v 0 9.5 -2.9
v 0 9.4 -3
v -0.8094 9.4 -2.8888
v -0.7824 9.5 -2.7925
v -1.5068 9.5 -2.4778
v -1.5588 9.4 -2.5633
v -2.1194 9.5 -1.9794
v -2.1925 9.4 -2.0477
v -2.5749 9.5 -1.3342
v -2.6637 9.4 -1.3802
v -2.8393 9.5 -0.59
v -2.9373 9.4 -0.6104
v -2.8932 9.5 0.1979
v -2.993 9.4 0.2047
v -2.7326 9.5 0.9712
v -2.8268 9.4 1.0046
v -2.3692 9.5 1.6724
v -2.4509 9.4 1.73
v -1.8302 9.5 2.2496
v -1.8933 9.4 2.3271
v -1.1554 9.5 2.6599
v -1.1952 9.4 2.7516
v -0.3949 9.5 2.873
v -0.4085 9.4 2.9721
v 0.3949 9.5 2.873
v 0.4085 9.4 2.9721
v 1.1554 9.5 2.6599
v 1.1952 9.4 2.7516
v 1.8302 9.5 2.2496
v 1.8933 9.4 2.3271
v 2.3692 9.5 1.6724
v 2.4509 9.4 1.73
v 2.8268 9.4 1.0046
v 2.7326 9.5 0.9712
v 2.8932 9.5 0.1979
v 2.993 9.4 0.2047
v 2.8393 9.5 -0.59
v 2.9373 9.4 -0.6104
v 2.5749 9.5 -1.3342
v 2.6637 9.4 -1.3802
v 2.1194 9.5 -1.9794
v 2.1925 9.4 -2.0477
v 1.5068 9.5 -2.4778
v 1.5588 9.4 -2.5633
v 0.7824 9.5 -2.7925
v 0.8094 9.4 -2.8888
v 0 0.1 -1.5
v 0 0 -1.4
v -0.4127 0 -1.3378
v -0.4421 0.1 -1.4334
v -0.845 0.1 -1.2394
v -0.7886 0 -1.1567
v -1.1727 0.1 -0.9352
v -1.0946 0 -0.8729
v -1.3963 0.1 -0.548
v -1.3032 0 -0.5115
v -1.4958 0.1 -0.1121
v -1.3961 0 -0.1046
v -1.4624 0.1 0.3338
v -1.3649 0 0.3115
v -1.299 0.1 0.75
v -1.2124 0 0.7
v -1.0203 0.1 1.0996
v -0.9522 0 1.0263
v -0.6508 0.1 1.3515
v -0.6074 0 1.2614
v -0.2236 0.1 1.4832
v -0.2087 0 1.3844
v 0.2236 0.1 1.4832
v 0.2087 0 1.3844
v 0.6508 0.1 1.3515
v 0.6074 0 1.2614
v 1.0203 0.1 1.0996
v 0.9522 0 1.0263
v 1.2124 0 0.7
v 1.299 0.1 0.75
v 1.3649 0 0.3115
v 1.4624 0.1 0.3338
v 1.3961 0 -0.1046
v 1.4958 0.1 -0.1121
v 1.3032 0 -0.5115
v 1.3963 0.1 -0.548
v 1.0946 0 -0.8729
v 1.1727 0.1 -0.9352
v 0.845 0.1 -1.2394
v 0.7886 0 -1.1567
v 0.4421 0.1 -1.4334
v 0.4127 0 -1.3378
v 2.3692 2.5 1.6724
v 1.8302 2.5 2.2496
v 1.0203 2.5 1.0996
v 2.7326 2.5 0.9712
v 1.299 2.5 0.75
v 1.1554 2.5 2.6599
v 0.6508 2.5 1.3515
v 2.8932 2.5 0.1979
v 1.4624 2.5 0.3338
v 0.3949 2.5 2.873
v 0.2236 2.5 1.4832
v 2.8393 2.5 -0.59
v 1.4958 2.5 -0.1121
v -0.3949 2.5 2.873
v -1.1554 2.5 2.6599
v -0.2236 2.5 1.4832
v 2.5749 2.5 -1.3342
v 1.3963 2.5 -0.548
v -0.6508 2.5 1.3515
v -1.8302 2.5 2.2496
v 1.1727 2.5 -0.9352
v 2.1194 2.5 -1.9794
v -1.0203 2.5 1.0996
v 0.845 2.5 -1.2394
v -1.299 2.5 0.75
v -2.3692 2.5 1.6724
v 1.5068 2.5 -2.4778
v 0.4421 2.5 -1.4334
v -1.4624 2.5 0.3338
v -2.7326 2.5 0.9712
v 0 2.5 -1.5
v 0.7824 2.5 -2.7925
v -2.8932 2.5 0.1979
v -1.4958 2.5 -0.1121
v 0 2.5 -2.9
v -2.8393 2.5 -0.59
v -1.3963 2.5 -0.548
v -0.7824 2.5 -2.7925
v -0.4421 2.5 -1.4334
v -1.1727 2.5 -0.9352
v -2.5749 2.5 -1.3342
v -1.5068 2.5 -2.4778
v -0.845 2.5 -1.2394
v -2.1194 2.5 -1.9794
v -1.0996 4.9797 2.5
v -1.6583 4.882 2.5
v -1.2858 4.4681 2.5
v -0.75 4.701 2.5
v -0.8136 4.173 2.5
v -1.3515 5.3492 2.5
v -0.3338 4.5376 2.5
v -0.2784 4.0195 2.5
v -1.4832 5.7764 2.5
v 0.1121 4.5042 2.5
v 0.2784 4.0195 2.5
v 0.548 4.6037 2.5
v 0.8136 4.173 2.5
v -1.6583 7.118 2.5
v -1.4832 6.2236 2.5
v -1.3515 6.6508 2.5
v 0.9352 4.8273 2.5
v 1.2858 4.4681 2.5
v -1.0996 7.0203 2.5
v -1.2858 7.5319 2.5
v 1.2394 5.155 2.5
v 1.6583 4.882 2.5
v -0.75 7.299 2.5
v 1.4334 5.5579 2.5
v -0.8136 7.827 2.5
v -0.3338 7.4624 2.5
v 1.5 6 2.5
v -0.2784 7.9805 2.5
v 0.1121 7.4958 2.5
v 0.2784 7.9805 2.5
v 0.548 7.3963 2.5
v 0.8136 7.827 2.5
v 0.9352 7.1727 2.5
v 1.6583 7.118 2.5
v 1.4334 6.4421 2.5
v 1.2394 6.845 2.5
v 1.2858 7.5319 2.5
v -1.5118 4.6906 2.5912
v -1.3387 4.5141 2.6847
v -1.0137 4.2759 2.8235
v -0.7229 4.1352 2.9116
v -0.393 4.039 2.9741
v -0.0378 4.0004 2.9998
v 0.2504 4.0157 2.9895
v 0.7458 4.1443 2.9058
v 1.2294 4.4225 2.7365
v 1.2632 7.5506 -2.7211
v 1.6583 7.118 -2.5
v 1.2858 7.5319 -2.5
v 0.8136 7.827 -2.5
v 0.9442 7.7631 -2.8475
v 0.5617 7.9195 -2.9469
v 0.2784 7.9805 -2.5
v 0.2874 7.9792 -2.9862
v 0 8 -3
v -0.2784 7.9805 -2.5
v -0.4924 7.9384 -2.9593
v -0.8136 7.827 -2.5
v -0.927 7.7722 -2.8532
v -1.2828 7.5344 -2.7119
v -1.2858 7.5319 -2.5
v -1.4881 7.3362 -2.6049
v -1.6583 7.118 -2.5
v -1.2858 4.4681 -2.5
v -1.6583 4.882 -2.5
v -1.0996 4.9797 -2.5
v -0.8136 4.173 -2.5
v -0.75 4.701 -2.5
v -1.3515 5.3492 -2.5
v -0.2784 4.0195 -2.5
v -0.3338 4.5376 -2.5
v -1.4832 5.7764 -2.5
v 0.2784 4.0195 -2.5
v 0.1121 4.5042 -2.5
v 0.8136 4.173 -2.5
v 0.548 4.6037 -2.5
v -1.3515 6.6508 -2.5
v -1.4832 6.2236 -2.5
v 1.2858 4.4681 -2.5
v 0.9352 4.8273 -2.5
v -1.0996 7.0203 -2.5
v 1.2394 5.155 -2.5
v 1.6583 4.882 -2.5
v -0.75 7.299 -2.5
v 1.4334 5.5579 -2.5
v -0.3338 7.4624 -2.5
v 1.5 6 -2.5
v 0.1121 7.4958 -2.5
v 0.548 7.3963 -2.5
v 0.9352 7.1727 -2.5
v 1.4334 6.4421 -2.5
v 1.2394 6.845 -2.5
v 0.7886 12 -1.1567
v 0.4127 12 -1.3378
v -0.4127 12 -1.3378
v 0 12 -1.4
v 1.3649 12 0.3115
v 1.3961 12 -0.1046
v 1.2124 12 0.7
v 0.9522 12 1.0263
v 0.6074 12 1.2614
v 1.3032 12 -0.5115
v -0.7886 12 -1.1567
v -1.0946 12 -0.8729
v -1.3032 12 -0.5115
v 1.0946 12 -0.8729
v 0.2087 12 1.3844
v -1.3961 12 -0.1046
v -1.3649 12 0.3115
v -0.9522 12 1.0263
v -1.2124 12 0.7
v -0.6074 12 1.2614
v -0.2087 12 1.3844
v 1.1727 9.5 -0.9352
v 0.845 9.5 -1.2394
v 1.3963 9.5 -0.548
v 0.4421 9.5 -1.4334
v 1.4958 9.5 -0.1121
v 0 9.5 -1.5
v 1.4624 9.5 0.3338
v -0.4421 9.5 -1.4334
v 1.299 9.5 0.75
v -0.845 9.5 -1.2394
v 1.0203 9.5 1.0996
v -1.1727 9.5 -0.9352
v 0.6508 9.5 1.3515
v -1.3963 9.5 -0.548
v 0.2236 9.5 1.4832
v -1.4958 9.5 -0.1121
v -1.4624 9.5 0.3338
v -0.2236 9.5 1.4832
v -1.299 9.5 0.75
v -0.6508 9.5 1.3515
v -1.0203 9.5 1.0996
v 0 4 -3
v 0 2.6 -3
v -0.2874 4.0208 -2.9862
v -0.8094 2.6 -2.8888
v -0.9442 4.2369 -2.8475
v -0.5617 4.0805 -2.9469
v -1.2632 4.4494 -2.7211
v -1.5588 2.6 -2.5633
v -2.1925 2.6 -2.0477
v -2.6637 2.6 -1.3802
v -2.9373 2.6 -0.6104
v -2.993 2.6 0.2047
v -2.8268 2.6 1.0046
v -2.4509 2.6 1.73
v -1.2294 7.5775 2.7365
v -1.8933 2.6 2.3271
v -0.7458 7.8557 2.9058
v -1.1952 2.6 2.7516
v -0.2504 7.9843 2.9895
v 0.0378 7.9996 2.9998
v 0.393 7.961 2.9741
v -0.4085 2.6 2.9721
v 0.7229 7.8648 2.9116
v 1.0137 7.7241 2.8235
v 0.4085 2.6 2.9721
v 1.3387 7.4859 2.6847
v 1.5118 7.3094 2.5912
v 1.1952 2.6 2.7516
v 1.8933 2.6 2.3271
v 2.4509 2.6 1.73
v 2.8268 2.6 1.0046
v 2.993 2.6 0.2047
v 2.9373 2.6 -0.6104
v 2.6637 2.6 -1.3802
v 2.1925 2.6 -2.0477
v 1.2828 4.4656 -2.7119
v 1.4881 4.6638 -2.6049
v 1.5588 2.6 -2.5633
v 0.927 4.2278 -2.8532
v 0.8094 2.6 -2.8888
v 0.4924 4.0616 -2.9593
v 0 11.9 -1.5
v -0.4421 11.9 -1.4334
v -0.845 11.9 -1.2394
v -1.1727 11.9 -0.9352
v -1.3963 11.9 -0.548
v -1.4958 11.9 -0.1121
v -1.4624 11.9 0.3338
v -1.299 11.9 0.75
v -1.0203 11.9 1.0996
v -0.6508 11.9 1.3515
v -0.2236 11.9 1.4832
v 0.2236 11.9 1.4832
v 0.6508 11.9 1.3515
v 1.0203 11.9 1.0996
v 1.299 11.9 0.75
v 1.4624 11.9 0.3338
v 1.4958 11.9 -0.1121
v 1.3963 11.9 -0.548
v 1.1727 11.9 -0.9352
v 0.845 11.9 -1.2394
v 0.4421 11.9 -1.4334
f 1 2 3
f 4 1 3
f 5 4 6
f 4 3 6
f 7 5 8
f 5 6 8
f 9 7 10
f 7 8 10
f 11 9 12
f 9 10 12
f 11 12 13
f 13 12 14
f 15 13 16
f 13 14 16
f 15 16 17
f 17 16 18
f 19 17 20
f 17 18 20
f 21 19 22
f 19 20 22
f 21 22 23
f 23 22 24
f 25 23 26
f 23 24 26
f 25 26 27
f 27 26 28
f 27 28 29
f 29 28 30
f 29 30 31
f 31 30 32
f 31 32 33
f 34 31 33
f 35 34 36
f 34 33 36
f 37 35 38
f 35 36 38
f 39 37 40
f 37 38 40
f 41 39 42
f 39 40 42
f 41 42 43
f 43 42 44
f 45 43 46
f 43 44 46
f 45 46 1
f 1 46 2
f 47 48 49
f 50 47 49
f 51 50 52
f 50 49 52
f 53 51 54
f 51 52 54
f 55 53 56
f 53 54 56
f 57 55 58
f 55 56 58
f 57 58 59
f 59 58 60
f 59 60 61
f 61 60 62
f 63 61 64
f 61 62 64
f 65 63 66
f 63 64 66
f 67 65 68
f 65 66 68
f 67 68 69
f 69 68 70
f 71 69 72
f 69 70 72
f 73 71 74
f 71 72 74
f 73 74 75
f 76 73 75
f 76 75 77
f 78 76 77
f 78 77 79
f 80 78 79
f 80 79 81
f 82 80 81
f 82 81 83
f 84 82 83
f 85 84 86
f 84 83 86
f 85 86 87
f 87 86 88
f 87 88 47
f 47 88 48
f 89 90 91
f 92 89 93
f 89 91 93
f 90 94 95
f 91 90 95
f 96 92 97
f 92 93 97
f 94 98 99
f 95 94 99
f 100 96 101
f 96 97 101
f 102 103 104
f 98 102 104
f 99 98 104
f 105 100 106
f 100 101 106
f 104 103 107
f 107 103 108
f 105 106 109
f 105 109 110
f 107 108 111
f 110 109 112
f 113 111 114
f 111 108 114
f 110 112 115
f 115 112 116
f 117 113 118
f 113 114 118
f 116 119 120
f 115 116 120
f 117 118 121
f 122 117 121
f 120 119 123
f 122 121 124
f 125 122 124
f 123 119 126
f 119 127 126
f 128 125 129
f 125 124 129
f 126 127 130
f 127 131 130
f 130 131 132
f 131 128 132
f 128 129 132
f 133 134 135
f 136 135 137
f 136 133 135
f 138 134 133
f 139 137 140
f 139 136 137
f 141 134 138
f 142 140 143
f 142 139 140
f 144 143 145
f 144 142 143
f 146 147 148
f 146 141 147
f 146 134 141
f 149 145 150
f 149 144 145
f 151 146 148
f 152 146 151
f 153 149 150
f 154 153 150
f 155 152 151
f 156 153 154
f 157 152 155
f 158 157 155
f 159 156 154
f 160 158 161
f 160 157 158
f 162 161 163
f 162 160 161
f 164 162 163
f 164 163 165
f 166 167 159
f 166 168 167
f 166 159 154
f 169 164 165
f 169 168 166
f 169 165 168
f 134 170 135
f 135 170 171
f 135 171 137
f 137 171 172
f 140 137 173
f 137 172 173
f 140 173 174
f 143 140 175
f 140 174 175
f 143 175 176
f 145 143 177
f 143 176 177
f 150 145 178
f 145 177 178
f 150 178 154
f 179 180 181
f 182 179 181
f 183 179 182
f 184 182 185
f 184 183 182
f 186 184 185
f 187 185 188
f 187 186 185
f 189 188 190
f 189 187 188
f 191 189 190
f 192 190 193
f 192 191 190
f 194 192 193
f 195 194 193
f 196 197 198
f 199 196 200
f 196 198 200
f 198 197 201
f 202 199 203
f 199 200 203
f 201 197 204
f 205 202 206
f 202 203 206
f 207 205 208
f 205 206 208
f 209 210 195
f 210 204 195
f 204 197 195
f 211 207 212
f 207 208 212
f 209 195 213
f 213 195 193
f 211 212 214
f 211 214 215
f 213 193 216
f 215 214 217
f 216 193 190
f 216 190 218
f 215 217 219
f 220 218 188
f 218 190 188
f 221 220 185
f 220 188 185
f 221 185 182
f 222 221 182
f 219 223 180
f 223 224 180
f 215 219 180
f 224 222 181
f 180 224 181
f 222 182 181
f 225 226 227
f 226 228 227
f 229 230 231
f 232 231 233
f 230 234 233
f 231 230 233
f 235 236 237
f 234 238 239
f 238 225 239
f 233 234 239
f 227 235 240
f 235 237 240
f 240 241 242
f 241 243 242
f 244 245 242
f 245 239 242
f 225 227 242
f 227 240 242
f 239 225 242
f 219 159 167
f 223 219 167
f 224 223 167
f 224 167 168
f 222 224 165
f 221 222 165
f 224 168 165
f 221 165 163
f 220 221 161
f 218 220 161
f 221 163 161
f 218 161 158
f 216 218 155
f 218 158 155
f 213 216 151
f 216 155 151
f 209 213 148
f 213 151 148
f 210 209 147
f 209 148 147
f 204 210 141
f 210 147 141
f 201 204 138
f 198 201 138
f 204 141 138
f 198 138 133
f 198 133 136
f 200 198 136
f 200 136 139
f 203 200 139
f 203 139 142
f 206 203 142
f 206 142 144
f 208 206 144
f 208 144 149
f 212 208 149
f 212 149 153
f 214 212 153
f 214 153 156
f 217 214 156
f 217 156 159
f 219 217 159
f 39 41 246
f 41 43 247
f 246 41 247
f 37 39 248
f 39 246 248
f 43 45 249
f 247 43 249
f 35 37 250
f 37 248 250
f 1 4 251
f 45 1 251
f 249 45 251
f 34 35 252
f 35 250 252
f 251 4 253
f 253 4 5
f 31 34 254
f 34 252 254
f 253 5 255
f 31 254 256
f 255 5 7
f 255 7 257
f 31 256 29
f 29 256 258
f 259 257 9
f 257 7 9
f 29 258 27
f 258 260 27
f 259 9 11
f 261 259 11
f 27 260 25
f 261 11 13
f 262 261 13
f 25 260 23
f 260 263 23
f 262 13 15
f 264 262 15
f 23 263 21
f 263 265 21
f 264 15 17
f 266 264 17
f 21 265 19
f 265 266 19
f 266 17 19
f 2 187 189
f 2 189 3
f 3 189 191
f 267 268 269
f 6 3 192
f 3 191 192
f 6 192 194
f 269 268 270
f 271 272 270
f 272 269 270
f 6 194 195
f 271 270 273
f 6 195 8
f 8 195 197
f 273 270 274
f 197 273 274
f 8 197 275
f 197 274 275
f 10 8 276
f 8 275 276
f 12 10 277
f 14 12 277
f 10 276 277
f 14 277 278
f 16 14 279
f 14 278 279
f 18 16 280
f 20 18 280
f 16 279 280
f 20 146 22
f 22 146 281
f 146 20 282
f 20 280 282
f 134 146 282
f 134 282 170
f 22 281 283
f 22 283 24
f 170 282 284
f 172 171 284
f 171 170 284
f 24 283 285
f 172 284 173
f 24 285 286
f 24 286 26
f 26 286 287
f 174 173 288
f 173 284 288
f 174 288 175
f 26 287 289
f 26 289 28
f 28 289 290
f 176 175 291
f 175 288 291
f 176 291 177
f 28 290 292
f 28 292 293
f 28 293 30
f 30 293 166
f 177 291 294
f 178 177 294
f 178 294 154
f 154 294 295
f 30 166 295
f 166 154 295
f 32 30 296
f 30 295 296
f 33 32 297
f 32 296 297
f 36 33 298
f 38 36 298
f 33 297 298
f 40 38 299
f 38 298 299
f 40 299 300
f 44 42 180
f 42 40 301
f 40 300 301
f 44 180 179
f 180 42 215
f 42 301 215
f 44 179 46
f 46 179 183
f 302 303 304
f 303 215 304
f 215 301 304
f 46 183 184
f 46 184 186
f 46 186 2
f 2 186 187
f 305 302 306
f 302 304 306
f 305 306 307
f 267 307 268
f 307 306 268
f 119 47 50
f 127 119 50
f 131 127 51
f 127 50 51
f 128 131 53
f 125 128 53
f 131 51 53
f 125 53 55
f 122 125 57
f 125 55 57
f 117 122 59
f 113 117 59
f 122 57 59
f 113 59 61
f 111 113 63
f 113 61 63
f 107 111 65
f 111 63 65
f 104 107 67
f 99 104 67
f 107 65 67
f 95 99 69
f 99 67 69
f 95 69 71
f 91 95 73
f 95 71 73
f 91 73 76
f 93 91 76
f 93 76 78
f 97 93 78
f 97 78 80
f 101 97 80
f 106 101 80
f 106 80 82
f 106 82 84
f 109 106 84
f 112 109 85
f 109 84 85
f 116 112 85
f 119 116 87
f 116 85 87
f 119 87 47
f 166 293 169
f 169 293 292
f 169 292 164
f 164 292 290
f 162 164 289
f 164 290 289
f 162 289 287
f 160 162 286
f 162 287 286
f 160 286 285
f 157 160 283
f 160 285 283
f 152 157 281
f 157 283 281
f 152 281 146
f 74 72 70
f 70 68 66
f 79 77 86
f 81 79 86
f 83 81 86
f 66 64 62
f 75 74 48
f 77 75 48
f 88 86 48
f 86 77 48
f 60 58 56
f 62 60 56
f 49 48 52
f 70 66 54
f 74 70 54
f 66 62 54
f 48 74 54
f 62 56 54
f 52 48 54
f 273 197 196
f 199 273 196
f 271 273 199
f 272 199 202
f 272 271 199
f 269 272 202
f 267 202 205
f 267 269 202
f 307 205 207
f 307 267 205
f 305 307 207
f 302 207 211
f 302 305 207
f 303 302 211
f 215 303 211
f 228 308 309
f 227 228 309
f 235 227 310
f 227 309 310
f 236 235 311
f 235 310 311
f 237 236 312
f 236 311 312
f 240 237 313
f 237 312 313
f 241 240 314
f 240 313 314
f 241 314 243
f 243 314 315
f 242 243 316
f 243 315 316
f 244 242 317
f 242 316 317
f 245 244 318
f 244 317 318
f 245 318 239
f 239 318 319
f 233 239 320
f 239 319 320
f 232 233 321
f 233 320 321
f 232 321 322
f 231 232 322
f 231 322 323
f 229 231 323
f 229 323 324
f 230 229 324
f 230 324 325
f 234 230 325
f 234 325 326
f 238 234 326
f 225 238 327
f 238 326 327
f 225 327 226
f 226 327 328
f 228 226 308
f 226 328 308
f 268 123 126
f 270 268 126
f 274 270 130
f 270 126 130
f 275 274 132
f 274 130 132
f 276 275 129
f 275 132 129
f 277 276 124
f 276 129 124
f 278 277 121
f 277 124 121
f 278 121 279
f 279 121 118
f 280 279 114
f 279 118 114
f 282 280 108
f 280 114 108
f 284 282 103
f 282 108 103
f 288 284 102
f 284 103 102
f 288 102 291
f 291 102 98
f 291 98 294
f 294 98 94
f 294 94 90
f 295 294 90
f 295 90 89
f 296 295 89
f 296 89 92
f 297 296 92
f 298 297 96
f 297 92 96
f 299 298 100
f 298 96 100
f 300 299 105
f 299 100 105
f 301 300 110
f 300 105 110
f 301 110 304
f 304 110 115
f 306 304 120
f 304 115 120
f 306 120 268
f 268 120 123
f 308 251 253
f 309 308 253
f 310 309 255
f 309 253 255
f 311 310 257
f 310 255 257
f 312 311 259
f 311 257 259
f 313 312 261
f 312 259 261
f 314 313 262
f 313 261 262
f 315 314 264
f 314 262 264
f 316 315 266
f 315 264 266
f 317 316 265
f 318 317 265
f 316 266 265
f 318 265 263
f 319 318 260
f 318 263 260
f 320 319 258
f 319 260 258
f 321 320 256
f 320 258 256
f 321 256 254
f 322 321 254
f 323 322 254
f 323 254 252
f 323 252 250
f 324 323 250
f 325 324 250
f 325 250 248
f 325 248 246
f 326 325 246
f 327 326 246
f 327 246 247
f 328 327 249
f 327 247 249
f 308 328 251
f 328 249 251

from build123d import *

# Parameters (mm, degrees)
SKETCH3_R          = 2
CUT_EXTRUDE2_DEPTH = 0.5
SKETCH5_R          = 1.5
CUT_EXTRUDE3_DEPTH = 14.536986433
CHAMFER1_SIZE      = 0.1


with BuildPart() as part:
    # Sketch2 → Revolve1 (revolve)
    with BuildSketch(Plane.XY, mode=Mode.PRIVATE) as revolve1_sk:
        Polygon((0, 0), (0, 12), (1.5, 12), (1.5, 9.5), (3, 9.5), (3, 2.5), (1.5, 2.5), (1.5, 0), align=None)
    revolve(revolve1_sk.sketch.rotate(Axis((0, 0, 0), (0, 1, 0)), 90), axis=Axis((0, 0, 0), (0, 1, 0)))

    # Sketch3 → Cut-Extrude2 (cut)
    with BuildSketch(Plane.XY.offset(3)):
        with Locations((0, 6)):
            Circle(SKETCH3_R)
    cut_extrude2 = extrude(amount=-CUT_EXTRUDE2_DEPTH, mode=Mode.SUBTRACT)

    # Mirror1: Cut-Extrude2 across plane
    add(cut_extrude2.mirror(Plane.XY), mode=Mode.SUBTRACT)

    # Sketch5 → Cut-Extrude3 (cut, through all)
    with BuildSketch(Plane.XY.offset(2.5)):
        with Locations((0, 6)):
            Circle(SKETCH5_R)
    extrude(amount=-CUT_EXTRUDE3_DEPTH, mode=Mode.SUBTRACT)

    # Chamfer1
    chamfer1_edges = [part.edges().sort_by_distance(p)[0] for p in [
        (0, 0, 1.5),
        (0, 2.5, 3),
        (0, 9.5, 3),
        (0, 12, 1.5),
    ]]
    chamfer(chamfer1_edges, length=CHAMFER1_SIZE)


solid = part.part
